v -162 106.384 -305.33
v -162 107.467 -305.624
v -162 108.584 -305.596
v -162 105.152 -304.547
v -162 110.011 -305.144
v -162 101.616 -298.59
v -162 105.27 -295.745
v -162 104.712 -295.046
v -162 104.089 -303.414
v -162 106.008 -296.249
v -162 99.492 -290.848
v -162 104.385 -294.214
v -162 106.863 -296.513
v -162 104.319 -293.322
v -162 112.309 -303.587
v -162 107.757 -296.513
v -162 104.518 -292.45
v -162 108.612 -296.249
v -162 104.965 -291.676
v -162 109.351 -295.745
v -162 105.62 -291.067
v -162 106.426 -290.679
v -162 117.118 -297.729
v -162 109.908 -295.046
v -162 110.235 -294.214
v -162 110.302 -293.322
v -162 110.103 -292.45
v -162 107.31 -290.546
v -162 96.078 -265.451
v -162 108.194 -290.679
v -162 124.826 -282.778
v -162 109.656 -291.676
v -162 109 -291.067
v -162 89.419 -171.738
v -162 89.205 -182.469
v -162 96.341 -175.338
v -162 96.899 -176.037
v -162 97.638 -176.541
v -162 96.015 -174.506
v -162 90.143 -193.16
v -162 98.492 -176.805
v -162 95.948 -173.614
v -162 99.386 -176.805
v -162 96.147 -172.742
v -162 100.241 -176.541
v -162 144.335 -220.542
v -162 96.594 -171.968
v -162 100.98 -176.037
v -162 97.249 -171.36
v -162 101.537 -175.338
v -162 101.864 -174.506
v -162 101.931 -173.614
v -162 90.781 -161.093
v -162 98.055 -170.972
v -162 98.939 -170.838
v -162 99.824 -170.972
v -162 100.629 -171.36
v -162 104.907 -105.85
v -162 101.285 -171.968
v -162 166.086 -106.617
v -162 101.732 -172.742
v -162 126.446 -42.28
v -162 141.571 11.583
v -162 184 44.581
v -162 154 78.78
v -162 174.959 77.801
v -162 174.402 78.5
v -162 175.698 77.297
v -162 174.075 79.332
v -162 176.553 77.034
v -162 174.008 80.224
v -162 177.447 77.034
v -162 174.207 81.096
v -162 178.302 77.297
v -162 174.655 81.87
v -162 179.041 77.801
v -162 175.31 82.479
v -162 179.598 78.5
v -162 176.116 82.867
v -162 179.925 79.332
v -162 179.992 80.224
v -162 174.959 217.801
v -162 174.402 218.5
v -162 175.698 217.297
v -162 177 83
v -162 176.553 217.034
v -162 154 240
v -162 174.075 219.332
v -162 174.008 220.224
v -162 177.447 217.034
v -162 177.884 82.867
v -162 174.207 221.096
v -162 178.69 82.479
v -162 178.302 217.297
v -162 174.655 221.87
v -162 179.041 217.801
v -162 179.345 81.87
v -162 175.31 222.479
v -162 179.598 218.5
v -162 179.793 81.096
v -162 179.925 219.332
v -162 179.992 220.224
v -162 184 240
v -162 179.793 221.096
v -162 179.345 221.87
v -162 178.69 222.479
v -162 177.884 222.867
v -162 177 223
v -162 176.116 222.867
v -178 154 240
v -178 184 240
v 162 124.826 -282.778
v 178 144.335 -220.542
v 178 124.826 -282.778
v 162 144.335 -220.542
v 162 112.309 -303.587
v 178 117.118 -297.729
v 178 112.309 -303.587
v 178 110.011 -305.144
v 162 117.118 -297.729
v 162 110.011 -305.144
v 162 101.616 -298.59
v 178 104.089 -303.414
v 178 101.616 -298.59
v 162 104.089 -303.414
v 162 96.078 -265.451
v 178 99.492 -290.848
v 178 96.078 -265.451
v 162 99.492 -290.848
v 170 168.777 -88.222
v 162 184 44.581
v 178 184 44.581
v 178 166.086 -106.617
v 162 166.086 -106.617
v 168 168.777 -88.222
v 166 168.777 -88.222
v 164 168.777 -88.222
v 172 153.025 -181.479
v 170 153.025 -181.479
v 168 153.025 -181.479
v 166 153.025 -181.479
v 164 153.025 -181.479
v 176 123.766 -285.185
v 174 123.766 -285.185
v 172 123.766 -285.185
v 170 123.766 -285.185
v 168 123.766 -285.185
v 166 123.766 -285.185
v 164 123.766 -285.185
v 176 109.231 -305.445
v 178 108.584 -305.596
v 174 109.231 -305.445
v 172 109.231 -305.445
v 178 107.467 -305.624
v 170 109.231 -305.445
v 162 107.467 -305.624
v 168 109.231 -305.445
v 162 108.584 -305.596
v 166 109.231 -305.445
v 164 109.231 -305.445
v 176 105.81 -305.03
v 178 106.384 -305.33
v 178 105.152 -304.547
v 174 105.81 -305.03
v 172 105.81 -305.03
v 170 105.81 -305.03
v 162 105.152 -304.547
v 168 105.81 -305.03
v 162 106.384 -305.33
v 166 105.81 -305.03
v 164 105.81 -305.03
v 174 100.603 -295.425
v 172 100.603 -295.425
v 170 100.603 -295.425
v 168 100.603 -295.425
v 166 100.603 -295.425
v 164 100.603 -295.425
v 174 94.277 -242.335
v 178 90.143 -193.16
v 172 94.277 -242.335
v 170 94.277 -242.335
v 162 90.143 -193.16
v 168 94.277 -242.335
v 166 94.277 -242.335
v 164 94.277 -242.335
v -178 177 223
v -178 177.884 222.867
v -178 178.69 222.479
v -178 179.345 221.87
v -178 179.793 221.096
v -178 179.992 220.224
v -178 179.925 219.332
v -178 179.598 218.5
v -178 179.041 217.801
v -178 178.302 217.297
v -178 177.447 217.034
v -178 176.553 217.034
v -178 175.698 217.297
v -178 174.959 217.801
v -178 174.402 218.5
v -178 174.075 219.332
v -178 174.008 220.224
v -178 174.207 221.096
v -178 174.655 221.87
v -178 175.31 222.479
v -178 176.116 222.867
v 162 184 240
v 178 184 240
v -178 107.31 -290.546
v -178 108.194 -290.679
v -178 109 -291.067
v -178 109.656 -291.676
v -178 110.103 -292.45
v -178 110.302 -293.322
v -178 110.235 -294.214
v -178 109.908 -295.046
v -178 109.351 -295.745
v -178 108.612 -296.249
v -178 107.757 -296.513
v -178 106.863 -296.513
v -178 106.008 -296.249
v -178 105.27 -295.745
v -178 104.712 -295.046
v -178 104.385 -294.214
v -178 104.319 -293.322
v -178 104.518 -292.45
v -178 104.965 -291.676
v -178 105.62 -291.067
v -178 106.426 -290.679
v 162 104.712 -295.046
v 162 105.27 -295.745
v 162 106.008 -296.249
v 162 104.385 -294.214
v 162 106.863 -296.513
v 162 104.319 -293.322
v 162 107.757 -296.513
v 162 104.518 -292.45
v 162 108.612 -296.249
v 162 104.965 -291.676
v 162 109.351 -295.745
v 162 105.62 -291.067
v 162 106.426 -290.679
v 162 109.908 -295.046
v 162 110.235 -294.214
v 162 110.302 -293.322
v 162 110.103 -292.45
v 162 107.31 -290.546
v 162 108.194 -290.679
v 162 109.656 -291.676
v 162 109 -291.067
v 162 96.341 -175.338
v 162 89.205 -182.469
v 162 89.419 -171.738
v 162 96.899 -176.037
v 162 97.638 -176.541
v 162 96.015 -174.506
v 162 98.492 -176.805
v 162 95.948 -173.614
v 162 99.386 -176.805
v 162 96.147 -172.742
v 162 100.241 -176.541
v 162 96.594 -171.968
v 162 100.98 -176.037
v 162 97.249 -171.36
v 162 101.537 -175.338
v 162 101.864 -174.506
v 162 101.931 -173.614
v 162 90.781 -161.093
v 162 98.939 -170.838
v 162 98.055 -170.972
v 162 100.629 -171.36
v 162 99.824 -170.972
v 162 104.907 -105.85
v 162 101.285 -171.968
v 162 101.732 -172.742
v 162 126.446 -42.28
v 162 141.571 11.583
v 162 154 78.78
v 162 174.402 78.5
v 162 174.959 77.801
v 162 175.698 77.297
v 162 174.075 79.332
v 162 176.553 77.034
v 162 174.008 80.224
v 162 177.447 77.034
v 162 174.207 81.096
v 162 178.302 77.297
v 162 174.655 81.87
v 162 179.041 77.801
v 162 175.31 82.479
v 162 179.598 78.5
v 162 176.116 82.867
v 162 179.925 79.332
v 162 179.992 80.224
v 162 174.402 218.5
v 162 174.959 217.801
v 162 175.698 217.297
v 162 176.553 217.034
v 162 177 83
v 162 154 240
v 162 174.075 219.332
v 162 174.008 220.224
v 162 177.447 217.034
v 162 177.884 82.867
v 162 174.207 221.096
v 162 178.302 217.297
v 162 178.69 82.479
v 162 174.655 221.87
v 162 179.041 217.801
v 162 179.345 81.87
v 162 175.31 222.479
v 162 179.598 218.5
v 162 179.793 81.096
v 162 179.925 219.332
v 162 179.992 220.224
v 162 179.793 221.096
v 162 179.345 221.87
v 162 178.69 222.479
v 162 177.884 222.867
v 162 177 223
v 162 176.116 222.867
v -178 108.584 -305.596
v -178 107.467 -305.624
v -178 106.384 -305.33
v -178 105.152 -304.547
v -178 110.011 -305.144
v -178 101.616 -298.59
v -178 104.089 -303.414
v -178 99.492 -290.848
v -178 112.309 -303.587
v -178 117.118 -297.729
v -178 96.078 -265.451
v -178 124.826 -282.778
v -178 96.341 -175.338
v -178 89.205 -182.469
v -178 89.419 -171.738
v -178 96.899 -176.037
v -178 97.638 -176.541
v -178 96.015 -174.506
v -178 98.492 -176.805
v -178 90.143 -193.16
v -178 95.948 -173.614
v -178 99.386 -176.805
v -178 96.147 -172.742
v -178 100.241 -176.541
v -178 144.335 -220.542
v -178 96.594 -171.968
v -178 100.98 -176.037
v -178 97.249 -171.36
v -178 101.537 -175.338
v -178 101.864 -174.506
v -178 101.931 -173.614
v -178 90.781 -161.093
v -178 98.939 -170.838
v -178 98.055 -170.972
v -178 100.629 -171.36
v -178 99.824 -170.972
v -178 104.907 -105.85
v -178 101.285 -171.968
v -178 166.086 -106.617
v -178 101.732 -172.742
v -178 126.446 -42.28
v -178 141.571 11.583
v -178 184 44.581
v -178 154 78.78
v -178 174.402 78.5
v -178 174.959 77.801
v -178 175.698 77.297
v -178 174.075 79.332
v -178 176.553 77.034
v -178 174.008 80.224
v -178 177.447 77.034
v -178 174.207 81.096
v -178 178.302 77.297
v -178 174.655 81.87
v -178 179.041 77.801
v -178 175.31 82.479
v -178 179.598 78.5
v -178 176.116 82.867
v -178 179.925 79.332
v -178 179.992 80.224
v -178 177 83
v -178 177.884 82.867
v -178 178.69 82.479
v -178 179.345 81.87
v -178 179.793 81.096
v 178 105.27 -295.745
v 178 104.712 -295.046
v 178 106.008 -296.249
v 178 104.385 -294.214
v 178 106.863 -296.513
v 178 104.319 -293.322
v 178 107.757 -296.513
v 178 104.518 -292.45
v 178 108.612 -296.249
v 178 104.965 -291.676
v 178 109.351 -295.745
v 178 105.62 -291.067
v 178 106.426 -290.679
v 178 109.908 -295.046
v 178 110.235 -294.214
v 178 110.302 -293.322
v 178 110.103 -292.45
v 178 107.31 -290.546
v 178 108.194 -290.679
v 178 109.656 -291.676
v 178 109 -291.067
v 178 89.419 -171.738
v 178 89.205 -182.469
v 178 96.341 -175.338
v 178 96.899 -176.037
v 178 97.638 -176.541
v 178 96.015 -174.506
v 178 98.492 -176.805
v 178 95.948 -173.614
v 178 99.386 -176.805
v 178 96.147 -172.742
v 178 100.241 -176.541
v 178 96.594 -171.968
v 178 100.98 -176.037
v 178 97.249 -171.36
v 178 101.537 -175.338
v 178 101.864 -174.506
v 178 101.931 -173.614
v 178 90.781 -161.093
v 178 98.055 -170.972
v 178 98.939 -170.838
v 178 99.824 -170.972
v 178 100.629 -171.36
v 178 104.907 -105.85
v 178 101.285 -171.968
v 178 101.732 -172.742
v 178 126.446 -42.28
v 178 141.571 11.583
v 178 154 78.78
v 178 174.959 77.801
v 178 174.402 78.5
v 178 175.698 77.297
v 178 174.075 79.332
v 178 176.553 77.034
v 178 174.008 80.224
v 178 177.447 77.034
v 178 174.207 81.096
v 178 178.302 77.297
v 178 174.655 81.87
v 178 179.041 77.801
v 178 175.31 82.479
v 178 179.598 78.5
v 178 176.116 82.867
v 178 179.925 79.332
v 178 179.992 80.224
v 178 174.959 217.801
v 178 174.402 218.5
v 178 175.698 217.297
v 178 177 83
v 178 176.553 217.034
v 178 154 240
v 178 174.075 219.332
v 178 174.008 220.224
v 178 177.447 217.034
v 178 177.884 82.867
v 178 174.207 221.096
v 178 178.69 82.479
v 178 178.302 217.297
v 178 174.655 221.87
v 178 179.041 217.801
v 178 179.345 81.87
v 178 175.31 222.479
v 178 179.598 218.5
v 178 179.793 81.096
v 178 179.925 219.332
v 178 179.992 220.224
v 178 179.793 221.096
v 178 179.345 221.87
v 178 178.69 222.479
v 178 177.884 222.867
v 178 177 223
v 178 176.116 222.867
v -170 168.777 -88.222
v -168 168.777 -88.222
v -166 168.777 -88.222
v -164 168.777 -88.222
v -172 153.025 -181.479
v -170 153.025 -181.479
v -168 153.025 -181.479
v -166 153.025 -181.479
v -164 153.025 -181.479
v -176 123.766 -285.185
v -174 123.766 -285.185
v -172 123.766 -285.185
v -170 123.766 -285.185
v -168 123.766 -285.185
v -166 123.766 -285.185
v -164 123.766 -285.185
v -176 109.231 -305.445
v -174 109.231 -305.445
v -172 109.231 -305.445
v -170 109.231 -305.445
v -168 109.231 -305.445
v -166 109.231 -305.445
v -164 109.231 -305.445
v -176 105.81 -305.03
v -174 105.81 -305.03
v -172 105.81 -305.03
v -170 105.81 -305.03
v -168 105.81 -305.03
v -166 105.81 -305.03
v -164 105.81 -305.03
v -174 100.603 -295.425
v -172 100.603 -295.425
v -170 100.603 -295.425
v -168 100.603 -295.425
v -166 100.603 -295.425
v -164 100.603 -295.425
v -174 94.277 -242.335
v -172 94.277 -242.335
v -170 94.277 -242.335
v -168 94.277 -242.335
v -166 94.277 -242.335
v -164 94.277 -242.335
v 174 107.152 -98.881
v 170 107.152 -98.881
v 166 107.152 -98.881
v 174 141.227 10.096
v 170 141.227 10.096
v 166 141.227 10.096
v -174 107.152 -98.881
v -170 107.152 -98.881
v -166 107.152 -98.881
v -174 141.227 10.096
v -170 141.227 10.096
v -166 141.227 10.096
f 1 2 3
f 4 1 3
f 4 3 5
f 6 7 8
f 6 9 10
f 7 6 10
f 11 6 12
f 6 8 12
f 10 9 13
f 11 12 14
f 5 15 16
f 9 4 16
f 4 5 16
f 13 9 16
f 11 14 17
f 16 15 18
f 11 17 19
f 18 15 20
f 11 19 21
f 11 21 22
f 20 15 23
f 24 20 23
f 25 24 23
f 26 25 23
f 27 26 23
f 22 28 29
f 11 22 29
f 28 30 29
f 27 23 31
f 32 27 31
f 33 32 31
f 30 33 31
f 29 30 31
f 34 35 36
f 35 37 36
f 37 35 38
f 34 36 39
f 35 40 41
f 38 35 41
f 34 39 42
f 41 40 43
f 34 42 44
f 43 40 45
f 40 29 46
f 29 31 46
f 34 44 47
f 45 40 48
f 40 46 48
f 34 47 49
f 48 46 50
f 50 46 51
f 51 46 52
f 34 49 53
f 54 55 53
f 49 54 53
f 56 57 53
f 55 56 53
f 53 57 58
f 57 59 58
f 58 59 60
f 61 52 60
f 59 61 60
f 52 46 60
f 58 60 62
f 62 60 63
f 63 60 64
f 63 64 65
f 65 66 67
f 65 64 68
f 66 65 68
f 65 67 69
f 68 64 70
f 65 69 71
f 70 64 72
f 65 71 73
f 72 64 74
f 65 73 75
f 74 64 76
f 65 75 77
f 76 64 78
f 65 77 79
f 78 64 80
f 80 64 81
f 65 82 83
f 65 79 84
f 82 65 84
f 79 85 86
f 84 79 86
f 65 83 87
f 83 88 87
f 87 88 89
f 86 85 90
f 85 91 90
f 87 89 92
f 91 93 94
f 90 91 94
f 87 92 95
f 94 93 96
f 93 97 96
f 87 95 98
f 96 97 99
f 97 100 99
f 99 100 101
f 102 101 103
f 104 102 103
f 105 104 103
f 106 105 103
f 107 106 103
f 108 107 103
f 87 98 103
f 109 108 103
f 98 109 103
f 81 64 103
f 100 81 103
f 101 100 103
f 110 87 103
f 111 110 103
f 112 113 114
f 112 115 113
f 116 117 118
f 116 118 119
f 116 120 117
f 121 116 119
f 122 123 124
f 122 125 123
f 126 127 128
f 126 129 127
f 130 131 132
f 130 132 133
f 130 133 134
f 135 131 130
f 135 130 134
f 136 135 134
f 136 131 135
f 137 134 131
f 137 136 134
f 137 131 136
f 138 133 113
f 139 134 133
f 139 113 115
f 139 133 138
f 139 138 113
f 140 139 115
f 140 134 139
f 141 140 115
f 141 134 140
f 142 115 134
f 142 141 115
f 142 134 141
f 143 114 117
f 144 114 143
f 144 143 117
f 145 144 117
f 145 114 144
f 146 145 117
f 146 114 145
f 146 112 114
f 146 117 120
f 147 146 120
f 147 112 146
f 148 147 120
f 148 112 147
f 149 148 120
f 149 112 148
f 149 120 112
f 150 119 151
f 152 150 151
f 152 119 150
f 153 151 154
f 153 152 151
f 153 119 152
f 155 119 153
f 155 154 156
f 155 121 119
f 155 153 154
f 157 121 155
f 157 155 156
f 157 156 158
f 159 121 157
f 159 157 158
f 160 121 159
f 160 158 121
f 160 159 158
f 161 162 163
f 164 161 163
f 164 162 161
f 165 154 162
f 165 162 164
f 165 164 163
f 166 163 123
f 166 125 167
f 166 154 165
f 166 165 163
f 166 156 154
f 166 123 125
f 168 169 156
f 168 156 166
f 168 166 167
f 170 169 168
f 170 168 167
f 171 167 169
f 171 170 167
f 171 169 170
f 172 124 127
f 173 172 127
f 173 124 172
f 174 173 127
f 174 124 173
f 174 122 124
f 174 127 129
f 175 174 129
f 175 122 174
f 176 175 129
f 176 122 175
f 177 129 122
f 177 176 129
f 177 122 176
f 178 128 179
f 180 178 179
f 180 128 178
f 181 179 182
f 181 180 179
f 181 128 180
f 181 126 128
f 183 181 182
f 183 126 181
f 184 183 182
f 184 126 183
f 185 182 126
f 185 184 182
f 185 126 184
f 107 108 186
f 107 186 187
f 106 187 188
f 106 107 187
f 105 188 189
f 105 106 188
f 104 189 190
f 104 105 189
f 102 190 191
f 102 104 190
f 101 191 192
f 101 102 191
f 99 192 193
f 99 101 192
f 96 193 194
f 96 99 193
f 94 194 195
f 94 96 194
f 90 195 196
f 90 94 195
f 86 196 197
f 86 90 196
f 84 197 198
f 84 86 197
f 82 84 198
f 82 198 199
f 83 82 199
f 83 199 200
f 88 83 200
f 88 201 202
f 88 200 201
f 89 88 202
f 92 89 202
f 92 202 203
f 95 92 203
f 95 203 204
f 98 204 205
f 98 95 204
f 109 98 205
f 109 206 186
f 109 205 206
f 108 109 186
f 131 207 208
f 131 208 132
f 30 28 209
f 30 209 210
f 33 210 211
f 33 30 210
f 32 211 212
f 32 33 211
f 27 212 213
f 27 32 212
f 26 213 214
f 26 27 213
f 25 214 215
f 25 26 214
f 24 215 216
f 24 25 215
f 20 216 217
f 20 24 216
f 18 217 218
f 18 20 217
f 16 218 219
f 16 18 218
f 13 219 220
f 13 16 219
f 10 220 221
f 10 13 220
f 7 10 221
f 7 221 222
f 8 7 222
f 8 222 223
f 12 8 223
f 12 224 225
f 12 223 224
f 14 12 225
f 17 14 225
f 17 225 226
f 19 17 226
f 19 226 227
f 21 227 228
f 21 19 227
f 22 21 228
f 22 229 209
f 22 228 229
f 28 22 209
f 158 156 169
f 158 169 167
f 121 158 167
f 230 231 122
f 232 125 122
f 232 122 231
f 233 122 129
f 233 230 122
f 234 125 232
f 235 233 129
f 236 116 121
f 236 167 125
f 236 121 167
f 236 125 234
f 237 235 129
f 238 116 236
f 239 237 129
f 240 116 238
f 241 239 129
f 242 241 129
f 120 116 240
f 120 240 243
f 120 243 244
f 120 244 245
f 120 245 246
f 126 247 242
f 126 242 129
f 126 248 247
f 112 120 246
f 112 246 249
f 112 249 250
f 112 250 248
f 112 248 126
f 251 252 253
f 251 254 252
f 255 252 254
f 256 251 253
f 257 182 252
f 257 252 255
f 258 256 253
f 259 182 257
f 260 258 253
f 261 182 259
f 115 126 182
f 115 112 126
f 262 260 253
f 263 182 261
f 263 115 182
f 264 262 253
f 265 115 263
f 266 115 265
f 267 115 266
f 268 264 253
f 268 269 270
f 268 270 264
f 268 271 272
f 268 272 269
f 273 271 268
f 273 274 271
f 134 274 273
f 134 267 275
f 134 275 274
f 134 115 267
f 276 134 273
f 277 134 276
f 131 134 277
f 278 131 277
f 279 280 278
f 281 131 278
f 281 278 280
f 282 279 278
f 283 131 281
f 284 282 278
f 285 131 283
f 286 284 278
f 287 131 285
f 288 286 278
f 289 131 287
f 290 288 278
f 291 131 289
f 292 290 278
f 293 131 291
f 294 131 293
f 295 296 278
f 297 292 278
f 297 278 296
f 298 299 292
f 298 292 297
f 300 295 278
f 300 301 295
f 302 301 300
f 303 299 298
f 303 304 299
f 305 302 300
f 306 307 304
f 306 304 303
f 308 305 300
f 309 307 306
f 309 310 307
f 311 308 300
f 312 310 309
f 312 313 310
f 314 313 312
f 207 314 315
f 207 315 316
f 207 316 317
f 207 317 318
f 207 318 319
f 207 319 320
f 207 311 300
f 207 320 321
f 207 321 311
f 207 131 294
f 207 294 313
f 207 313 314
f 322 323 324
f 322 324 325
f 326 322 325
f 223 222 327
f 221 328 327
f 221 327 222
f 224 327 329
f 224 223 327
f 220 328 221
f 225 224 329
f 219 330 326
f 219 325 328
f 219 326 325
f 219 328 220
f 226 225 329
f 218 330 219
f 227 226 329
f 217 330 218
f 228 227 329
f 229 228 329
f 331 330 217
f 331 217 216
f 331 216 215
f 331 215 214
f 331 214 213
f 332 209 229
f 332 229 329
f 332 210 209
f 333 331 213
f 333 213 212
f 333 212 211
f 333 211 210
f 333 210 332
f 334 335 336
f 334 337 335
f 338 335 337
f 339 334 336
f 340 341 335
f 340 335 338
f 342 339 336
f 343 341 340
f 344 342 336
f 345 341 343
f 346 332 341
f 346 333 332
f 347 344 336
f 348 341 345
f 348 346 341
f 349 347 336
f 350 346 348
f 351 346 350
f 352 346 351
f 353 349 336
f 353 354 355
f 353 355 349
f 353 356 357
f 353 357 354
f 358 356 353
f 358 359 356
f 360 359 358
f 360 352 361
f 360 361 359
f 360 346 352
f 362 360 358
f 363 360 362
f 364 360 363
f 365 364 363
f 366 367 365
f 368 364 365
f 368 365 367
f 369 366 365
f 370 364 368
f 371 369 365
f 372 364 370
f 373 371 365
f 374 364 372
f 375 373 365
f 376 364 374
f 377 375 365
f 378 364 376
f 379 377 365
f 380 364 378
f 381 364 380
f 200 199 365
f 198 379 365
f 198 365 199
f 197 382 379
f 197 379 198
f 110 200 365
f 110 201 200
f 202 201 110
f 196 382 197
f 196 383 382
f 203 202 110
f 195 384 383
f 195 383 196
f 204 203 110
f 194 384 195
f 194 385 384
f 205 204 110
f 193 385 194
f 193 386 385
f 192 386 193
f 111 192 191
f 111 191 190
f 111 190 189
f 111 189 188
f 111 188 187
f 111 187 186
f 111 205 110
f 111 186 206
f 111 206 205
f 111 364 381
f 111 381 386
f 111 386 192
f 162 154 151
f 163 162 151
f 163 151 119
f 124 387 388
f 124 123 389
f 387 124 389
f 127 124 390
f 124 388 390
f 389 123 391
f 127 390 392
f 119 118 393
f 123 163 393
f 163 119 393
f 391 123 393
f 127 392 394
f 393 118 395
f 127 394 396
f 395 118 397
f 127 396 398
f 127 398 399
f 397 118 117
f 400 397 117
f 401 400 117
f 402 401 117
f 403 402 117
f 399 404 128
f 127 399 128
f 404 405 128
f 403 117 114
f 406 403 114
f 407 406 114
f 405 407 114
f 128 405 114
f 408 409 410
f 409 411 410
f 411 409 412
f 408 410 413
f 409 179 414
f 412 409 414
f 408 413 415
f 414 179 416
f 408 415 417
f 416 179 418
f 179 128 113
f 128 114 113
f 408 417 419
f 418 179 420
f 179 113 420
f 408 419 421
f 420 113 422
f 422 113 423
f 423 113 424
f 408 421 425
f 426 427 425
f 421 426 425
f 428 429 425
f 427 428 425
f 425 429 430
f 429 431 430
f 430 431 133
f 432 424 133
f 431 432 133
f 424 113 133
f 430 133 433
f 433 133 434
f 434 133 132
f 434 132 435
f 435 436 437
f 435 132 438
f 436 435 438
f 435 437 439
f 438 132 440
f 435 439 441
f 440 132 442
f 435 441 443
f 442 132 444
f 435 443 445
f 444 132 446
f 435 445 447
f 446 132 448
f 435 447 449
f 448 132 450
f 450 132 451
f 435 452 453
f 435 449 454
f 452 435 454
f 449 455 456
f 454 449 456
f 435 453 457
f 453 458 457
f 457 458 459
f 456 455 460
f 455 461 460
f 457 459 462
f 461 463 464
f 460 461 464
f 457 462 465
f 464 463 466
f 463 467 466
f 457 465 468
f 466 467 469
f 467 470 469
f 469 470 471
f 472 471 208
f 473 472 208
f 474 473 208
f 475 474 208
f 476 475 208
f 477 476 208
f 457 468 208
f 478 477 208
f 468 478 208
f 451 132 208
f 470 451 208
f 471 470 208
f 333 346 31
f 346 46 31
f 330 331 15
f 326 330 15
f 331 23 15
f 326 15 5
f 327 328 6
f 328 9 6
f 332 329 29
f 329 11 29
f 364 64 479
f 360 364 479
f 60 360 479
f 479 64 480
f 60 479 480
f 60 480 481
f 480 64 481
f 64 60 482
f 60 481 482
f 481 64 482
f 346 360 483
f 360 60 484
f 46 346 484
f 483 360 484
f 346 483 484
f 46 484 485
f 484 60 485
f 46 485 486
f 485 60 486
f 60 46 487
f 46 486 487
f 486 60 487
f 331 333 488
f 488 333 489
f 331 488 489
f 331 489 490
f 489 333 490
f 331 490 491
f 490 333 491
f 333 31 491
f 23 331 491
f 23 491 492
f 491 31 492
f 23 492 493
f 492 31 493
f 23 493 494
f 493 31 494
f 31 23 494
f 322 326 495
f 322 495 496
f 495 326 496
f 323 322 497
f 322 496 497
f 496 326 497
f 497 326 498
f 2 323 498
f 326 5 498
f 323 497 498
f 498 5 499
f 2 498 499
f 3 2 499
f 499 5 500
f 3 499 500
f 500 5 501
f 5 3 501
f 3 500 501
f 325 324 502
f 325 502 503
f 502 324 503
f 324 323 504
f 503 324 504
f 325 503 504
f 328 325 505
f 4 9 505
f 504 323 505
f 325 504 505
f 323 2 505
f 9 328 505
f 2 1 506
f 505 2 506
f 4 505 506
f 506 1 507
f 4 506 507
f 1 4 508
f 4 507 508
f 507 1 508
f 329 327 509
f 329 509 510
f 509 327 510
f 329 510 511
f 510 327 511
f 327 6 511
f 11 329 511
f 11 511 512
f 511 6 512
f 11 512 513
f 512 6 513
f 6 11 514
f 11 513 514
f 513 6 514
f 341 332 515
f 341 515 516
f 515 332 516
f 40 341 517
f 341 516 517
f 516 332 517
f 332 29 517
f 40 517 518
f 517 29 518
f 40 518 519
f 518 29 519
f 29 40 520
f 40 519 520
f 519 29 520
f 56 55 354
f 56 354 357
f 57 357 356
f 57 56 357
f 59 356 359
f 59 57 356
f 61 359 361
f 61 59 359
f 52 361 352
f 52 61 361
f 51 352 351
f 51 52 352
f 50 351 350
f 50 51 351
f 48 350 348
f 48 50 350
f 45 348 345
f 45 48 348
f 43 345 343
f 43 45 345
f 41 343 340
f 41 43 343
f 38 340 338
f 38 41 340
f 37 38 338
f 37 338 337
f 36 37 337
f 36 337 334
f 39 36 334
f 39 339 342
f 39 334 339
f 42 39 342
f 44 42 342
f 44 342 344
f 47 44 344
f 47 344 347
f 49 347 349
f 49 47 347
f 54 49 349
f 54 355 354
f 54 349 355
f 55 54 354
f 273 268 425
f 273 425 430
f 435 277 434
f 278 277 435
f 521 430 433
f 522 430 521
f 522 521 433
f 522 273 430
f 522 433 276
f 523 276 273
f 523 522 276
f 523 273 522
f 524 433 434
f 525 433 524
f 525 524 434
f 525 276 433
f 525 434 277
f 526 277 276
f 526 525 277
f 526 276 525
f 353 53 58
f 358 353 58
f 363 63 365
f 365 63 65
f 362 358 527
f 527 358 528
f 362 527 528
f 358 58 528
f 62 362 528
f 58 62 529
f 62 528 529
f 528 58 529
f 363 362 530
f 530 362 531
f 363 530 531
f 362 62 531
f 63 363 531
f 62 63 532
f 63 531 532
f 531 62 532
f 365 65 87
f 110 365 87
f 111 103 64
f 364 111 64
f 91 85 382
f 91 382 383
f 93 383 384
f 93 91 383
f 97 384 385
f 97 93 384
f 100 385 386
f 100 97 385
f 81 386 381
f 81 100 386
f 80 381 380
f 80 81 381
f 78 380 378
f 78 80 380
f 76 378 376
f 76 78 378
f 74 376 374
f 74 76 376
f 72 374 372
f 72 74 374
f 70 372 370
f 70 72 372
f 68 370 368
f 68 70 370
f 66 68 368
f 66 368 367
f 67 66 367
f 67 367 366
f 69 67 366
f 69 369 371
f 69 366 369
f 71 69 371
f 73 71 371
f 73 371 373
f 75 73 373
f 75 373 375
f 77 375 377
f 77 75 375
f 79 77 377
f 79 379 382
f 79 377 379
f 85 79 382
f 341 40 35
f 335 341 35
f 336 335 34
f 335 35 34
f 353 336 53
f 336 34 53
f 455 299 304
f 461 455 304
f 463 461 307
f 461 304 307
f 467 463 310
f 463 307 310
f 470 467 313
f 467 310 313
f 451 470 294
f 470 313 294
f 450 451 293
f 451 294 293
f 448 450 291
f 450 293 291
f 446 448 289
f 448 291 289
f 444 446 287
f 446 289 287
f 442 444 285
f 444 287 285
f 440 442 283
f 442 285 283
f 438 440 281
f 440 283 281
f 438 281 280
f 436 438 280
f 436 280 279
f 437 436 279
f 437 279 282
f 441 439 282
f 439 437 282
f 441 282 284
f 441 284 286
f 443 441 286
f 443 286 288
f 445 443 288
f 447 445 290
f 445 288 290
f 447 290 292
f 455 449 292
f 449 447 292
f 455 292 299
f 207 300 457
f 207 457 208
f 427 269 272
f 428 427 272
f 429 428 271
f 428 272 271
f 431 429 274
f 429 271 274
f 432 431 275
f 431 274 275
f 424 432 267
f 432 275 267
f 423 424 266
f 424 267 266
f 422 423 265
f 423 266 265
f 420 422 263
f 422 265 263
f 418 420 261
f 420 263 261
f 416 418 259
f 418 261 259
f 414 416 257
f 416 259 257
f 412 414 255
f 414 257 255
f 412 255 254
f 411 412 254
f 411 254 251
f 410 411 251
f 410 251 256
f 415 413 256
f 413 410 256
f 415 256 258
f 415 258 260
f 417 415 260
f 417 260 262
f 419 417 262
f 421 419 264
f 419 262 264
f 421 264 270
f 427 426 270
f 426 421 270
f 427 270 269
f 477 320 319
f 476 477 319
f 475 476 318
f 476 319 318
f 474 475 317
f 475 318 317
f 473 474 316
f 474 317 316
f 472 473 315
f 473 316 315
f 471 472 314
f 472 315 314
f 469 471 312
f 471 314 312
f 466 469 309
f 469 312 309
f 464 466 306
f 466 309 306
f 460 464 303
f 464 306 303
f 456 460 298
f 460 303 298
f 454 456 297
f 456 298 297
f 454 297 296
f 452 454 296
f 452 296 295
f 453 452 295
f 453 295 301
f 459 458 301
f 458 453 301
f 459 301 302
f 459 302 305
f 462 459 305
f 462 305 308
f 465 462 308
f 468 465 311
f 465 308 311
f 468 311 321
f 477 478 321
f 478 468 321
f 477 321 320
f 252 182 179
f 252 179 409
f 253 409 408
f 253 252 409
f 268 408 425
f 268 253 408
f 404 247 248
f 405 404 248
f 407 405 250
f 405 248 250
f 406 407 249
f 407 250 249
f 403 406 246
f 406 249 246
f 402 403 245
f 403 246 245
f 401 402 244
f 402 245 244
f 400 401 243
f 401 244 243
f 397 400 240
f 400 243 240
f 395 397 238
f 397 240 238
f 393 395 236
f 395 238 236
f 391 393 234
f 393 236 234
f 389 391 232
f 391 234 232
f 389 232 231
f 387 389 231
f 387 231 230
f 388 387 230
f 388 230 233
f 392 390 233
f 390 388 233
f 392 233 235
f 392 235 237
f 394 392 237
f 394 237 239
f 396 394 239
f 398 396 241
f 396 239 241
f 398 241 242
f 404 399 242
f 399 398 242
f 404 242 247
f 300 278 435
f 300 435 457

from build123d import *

# Parameters (mm, degrees)
BOSS_EXTRUDE1_START     = -8
BOSS_EXTRUDE1_DEPTH     = 16
CUT_EXTRUDE1_DEPTH      = 357.850215718
CUT_EXTRUDE1_DEPTH_BACK = 357.850215718
SKETCH3_R               = 3


# Read off the part's stored shape, not the designer's step: Boss-Extrude1
with BuildPart() as part:
    # Boss-Extrude1 outline → Boss-Extrude1 (new body)
    with BuildSketch(Plane.ZY.offset(170).offset(BOSS_EXTRUDE1_START)):
        with BuildLine():
            Line((240, 154), (240, 184))
            Line((240, 184), (44.580705645, 184))
            add(Edge.make_bspline(
                [(44.580705645, 184), (-57.767979852, 174.527100953), (-305.521879125, 149.248640345), (-306.889667667, 116.120839414), (-325.983667032, 107.106894681), (-312.443719399, 102.442751763), (-318.80884118, 94.810587603), (-234.776346203, 96.05757536), (-193.159902981, 90.143019518)],
                knots=[0, 0, 0, 0, 0, 0, 0, 0, 0, 1, 1, 1, 1, 1, 1, 1, 1, 1], degree=8))
            ThreePointArc((-193.159902981, 90.143019518), (-177.100635592, 89.167925938), (-161.092843133, 90.78082926))
            add(Edge.make_bspline(
                [(-161.092843133, 90.78082926), (-92.518943208, 103.326483389), (-43.151690065, 130.858776096), (-1.805394367, 141.508864751), (78.779942876, 154)],
                knots=[0, 0, 0, 0, 0, 1, 1, 1, 1, 1], degree=4))
            Line((78.779942876, 154), (240, 154))
        make_face()
    extrude(amount=BOSS_EXTRUDE1_DEPTH)

    # Sketch3 → Cut-Extrude1 (cut, two sides: drawn at the far end of the back side and taken through both)
    with BuildSketch(Plane.ZY.offset(170).offset(-CUT_EXTRUDE1_DEPTH_BACK)):
        with Locations((-293.546030237, 107.310137802)):
            Circle(SKETCH3_R)
        with Locations((-173.838344205, 98.939360953)):
            Circle(SKETCH3_R)
        with Locations((220, 177)):
            Circle(SKETCH3_R)
        with Locations((80, 177)):
            Circle(SKETCH3_R)
    extrude(amount=CUT_EXTRUDE1_DEPTH + CUT_EXTRUDE1_DEPTH_BACK, mode=Mode.SUBTRACT)


with BuildPart() as body_2:
    # Mirror2: mirrored copy
    add(part.part.mirror(Plane(origin=(0, 0, 0), x_dir=(0, 0, 1), z_dir=(1, 0, 0))))


solid = Compound([part.part, body_2.part])
